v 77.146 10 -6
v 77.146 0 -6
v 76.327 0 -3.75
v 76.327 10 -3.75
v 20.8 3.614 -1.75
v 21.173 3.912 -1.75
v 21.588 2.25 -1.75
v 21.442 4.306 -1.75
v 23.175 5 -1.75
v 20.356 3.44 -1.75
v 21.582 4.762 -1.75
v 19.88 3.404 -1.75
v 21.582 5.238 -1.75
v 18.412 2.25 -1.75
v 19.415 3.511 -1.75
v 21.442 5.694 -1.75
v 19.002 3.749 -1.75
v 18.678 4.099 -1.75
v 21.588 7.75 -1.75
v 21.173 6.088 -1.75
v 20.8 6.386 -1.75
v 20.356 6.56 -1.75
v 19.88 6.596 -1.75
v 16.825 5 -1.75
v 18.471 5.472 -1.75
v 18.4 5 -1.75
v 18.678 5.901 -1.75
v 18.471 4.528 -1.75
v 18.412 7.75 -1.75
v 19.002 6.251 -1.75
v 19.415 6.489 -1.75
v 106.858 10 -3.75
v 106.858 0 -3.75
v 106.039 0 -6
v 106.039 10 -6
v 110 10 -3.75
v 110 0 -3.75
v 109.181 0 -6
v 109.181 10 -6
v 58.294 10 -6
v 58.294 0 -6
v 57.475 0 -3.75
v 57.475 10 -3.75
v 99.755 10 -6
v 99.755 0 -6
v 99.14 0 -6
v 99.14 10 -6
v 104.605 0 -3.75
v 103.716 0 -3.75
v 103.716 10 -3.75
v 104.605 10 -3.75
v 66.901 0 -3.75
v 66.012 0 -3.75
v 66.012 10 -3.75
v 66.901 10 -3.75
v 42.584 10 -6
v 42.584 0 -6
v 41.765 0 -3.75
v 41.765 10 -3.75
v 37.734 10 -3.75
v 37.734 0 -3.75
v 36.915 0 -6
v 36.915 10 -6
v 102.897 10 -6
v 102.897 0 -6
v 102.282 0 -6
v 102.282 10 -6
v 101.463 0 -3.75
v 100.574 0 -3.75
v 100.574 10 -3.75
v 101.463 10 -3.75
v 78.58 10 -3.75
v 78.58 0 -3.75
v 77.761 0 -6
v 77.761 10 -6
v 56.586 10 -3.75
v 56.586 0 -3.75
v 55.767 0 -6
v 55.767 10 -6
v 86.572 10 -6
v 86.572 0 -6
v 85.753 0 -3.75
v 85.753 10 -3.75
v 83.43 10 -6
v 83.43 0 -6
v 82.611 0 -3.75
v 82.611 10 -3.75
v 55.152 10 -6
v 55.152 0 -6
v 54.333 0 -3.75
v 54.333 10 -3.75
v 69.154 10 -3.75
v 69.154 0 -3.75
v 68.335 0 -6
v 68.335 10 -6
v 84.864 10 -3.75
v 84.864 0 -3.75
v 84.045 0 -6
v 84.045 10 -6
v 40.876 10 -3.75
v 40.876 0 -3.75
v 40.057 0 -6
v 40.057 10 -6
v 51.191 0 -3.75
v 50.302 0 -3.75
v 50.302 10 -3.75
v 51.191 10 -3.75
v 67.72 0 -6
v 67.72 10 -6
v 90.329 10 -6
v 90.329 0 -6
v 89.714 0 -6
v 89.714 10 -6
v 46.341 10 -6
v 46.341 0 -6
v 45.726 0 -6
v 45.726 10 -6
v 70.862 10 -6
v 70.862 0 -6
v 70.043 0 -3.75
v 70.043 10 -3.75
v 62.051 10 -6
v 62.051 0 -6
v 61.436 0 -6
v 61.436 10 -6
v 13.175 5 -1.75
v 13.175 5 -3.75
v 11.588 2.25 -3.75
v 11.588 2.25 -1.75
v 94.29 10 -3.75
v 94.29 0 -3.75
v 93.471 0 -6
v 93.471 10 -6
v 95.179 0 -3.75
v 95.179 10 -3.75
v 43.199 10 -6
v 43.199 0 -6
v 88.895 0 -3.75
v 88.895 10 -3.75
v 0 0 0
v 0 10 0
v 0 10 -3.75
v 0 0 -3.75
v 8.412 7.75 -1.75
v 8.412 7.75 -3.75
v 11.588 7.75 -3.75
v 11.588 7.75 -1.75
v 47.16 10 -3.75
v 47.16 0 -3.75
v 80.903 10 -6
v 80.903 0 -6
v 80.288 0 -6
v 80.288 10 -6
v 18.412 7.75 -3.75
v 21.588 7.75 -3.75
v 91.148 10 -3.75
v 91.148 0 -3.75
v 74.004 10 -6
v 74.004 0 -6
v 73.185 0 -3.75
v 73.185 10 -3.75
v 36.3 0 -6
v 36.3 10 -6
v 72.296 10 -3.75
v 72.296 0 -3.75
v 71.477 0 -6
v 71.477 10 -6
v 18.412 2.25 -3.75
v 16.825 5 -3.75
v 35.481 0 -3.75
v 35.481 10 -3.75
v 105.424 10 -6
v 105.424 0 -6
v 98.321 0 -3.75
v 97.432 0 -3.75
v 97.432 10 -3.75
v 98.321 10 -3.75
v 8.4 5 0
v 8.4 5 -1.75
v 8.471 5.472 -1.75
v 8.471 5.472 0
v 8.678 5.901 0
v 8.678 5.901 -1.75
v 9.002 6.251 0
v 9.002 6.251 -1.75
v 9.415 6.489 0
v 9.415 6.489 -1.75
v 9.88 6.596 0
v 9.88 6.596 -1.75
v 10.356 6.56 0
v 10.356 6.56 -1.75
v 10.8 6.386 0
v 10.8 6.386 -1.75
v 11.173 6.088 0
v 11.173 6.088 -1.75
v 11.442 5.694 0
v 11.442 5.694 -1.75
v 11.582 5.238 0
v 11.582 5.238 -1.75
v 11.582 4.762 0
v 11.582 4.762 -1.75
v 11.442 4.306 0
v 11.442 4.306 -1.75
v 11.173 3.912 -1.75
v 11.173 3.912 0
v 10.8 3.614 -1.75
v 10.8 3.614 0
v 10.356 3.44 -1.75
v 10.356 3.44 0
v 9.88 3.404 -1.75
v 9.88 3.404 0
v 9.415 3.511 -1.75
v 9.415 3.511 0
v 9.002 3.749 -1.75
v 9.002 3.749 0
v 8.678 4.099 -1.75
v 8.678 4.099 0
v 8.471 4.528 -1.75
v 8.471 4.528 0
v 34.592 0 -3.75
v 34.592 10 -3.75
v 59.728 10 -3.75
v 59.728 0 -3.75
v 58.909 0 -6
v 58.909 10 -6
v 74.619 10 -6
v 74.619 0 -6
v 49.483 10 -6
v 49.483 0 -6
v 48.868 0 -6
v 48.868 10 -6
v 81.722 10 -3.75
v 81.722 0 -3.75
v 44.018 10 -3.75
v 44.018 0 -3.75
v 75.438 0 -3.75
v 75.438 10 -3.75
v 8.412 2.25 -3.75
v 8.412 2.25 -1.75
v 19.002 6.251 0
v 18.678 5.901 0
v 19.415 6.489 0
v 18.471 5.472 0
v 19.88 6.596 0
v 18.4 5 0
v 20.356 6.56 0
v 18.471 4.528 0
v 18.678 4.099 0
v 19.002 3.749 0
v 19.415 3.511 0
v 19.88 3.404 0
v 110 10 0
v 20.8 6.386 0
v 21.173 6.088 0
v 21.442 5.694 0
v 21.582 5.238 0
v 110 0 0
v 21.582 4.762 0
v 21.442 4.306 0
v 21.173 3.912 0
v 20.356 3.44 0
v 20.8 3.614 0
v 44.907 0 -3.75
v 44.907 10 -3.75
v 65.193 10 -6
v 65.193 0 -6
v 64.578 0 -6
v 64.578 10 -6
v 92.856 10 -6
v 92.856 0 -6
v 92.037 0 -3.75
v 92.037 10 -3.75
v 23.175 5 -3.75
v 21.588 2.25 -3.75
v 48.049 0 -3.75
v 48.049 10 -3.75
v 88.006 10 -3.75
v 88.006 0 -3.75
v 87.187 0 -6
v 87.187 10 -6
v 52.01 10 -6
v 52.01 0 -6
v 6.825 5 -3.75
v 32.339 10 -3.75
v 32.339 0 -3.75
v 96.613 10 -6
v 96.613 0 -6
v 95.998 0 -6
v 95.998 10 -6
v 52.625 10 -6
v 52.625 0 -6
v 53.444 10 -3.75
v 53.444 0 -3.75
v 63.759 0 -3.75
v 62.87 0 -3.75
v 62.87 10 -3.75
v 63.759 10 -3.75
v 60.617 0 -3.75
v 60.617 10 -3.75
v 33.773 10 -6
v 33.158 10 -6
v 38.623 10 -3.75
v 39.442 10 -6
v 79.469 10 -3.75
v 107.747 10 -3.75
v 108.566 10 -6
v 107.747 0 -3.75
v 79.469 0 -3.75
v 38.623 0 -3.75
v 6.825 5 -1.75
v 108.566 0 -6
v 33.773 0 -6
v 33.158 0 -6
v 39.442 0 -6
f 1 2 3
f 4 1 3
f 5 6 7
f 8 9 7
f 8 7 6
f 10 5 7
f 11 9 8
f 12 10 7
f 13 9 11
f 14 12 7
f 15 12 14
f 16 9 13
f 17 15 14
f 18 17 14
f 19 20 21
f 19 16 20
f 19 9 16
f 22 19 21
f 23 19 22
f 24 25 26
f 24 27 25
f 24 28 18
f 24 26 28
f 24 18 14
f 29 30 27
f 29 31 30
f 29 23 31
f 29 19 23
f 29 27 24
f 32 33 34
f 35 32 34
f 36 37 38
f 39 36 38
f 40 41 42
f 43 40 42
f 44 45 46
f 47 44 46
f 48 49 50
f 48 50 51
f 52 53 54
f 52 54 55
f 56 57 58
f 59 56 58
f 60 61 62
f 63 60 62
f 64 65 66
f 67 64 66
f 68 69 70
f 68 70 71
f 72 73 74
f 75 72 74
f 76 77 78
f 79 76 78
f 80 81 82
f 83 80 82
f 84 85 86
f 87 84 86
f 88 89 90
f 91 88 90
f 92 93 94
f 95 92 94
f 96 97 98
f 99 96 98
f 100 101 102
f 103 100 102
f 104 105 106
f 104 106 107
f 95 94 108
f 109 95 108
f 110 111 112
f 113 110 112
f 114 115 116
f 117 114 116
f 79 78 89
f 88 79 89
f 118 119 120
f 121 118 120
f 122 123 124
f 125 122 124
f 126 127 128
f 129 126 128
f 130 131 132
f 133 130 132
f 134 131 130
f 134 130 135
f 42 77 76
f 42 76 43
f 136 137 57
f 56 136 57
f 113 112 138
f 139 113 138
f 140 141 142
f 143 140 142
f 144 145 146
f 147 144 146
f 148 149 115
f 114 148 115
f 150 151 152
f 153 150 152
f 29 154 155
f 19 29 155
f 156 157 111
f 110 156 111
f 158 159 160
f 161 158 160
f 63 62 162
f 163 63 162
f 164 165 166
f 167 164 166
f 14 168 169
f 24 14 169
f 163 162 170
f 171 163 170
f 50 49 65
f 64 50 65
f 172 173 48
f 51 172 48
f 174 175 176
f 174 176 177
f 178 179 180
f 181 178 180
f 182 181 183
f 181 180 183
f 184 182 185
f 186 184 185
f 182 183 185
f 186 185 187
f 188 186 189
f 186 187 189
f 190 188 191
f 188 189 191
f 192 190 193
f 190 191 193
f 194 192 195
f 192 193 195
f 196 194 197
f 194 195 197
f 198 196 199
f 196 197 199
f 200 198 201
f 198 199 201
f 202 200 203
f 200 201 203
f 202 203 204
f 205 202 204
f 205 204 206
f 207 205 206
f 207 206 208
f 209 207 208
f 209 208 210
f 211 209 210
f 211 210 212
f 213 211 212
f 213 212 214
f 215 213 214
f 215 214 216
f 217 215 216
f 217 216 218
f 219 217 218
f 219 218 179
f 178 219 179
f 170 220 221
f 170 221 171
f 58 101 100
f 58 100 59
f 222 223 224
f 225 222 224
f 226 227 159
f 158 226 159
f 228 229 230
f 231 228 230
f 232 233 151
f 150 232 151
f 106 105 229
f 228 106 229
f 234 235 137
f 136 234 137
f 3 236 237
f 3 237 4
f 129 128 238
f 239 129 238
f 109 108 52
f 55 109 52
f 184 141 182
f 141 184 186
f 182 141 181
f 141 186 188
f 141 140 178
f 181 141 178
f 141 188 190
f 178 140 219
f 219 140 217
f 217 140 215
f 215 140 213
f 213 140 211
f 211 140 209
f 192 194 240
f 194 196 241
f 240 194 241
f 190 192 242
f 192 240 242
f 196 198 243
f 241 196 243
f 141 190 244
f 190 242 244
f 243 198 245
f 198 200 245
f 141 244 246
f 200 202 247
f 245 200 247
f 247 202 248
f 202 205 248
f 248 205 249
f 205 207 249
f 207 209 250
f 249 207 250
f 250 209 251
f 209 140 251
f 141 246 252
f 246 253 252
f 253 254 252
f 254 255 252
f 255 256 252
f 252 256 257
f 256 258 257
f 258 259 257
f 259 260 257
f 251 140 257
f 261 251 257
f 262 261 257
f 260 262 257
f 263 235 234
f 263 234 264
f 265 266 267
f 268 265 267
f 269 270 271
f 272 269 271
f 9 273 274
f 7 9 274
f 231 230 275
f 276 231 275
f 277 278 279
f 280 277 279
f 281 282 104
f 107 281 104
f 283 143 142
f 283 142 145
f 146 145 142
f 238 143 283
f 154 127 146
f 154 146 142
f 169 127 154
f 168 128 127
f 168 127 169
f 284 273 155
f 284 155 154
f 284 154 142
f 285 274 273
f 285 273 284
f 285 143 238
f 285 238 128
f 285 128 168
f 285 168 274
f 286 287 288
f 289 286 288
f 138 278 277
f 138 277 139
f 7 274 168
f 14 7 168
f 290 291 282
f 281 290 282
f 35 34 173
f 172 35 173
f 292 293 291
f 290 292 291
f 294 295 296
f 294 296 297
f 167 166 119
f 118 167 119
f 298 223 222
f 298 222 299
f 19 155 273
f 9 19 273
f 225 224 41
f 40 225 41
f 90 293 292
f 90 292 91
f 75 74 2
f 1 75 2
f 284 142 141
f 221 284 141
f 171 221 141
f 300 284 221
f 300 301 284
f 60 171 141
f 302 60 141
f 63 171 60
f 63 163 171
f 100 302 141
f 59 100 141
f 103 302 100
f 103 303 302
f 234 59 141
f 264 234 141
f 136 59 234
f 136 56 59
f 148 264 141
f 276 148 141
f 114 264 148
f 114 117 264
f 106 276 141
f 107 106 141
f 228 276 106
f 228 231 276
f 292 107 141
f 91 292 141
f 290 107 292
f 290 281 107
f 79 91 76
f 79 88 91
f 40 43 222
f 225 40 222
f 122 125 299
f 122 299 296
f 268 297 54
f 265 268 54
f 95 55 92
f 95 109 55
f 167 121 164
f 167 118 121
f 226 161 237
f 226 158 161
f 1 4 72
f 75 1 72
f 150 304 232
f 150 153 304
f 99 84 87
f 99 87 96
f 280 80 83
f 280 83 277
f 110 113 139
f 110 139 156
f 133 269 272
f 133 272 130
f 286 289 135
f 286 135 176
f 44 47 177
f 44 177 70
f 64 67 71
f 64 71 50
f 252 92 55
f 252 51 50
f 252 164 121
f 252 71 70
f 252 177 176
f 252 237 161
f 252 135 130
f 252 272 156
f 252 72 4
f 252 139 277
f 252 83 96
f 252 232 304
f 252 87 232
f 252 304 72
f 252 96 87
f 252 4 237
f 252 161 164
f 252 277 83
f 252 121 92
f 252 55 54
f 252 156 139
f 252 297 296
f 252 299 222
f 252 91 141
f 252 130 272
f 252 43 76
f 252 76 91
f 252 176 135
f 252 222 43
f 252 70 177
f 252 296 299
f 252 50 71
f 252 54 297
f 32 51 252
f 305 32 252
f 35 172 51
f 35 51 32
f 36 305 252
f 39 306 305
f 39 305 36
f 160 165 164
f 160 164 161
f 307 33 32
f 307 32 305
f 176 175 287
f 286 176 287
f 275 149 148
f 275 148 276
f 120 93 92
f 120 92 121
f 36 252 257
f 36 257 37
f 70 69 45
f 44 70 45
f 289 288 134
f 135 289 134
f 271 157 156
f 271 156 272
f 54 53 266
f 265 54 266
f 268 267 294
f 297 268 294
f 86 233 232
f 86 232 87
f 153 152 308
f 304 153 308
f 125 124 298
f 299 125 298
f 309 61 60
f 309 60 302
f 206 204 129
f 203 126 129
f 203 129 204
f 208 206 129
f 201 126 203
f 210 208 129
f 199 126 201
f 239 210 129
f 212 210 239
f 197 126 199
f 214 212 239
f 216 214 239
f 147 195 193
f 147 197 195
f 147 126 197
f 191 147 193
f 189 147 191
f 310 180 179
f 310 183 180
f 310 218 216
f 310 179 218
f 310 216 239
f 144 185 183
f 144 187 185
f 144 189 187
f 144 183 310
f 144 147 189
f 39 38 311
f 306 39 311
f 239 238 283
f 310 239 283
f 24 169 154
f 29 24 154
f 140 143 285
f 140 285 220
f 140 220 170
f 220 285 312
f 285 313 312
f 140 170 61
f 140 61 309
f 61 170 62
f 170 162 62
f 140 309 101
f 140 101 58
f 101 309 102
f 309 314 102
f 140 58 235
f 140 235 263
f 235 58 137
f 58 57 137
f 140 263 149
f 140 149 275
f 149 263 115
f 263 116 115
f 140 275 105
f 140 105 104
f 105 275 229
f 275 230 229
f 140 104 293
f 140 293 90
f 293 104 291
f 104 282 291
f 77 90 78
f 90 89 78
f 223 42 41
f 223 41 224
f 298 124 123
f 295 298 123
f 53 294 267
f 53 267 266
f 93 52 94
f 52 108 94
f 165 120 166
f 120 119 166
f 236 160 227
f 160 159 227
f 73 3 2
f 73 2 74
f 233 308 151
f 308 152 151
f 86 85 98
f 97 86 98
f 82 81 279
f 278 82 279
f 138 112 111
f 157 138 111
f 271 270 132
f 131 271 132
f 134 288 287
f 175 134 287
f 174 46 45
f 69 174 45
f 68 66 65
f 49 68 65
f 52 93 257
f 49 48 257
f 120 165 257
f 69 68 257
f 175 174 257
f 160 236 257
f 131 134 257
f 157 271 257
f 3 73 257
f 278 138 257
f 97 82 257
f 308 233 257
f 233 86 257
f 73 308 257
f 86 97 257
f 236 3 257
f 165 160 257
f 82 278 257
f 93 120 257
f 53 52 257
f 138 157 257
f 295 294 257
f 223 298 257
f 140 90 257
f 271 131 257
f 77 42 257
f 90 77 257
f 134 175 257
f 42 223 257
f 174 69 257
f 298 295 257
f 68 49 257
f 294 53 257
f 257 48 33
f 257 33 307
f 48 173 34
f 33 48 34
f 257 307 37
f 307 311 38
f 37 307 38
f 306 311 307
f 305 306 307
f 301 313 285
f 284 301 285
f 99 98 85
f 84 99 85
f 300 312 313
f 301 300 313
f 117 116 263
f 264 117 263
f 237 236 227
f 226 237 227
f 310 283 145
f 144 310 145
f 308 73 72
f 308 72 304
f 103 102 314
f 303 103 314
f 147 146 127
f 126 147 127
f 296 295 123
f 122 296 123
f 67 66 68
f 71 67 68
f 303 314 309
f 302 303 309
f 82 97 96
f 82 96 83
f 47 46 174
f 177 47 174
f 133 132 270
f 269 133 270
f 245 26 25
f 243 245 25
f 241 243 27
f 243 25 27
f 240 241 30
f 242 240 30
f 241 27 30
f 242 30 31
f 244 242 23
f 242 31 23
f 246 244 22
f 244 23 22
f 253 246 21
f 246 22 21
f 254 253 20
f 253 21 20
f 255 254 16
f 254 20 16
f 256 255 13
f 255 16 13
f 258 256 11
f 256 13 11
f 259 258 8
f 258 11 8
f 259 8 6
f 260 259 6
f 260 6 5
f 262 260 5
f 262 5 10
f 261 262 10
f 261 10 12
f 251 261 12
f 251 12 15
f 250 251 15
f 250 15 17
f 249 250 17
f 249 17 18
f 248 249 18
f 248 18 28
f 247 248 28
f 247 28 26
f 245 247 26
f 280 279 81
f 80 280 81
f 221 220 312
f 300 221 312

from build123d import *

# Parameters (mm, degrees)
EXTRUDE_1_DEPTH        = 10
EXTRUDE_2_DEPTH        = 10
PATTERN_LINEAR_1_COUNT = 25
PATTERN_LINEAR_1_PITCH = 3.142
SKETCH_2_R             = 1.6
CUT_EXTRUDE_1_DEPTH    = 10
CUT_EXTRUDE_2_DEPTH    = 2


with BuildPart() as part:
    # 草图1 → 凸台-拉伸1 (new body)
    with BuildSketch(Plane(origin=(0, 0, 0), x_dir=(1, 0, 0), z_dir=(0, 1, 0))):
        Polygon((0, 3.75), (0, 0), (110, 0), (110, 3.75), (107.747407554, 3.75), align=None)
    extrude(amount=EXTRUDE_1_DEPTH)

    # 草图1<5> → 凸台-拉伸2 (add)
    with BuildSketch(Plane(origin=(0, 0, 0), x_dir=(1, 0, 0), z_dir=(0, 1, 0))):
        Polygon((107.747407554, 3.75), (110, 3.75), (109.181203777, 5.999624134), (108.566203777, 5.999624134), align=None)
    extrude_2 = extrude(amount=EXTRUDE_2_DEPTH)

    # 阵列(线性)1: 凸台-拉伸2 ×25
    with Locations(*[(-i * PATTERN_LINEAR_1_PITCH, 0, 0) for i in range(1, PATTERN_LINEAR_1_COUNT)]):
        add(extrude_2)

    # 草图2 → 切除-拉伸1 (cut)
    with BuildSketch(Plane(origin=(0, 0, -3.75), x_dir=(-1, 0, 0), z_dir=(0, 0, -1))):
        with Locations((-10, 5)):
            Circle(SKETCH_2_R)
        with Locations((-20, 5)):
            Circle(SKETCH_2_R)
    extrude(amount=-CUT_EXTRUDE_1_DEPTH, mode=Mode.SUBTRACT)

    # 草图3 → 切除-拉伸2 (cut)
    with BuildSketch(Plane(origin=(0, 0, -3.75), x_dir=(-1, 0, 0), z_dir=(0, 0, -1))):
        Polygon((-21.58771324, 7.75), (-23.175426481, 5), (-21.58771324, 2.25), (-18.41228676, 2.25), (-16.824573519, 5), (-18.41228676, 7.75), align=None)
        Polygon((-11.58771324, 7.75), (-13.175426481, 5), (-11.58771324, 2.25), (-8.41228676, 2.25), (-6.824573519, 5), (-8.41228676, 7.75), align=None)
    extrude(amount=-CUT_EXTRUDE_2_DEPTH, mode=Mode.SUBTRACT)


solid = part.part
